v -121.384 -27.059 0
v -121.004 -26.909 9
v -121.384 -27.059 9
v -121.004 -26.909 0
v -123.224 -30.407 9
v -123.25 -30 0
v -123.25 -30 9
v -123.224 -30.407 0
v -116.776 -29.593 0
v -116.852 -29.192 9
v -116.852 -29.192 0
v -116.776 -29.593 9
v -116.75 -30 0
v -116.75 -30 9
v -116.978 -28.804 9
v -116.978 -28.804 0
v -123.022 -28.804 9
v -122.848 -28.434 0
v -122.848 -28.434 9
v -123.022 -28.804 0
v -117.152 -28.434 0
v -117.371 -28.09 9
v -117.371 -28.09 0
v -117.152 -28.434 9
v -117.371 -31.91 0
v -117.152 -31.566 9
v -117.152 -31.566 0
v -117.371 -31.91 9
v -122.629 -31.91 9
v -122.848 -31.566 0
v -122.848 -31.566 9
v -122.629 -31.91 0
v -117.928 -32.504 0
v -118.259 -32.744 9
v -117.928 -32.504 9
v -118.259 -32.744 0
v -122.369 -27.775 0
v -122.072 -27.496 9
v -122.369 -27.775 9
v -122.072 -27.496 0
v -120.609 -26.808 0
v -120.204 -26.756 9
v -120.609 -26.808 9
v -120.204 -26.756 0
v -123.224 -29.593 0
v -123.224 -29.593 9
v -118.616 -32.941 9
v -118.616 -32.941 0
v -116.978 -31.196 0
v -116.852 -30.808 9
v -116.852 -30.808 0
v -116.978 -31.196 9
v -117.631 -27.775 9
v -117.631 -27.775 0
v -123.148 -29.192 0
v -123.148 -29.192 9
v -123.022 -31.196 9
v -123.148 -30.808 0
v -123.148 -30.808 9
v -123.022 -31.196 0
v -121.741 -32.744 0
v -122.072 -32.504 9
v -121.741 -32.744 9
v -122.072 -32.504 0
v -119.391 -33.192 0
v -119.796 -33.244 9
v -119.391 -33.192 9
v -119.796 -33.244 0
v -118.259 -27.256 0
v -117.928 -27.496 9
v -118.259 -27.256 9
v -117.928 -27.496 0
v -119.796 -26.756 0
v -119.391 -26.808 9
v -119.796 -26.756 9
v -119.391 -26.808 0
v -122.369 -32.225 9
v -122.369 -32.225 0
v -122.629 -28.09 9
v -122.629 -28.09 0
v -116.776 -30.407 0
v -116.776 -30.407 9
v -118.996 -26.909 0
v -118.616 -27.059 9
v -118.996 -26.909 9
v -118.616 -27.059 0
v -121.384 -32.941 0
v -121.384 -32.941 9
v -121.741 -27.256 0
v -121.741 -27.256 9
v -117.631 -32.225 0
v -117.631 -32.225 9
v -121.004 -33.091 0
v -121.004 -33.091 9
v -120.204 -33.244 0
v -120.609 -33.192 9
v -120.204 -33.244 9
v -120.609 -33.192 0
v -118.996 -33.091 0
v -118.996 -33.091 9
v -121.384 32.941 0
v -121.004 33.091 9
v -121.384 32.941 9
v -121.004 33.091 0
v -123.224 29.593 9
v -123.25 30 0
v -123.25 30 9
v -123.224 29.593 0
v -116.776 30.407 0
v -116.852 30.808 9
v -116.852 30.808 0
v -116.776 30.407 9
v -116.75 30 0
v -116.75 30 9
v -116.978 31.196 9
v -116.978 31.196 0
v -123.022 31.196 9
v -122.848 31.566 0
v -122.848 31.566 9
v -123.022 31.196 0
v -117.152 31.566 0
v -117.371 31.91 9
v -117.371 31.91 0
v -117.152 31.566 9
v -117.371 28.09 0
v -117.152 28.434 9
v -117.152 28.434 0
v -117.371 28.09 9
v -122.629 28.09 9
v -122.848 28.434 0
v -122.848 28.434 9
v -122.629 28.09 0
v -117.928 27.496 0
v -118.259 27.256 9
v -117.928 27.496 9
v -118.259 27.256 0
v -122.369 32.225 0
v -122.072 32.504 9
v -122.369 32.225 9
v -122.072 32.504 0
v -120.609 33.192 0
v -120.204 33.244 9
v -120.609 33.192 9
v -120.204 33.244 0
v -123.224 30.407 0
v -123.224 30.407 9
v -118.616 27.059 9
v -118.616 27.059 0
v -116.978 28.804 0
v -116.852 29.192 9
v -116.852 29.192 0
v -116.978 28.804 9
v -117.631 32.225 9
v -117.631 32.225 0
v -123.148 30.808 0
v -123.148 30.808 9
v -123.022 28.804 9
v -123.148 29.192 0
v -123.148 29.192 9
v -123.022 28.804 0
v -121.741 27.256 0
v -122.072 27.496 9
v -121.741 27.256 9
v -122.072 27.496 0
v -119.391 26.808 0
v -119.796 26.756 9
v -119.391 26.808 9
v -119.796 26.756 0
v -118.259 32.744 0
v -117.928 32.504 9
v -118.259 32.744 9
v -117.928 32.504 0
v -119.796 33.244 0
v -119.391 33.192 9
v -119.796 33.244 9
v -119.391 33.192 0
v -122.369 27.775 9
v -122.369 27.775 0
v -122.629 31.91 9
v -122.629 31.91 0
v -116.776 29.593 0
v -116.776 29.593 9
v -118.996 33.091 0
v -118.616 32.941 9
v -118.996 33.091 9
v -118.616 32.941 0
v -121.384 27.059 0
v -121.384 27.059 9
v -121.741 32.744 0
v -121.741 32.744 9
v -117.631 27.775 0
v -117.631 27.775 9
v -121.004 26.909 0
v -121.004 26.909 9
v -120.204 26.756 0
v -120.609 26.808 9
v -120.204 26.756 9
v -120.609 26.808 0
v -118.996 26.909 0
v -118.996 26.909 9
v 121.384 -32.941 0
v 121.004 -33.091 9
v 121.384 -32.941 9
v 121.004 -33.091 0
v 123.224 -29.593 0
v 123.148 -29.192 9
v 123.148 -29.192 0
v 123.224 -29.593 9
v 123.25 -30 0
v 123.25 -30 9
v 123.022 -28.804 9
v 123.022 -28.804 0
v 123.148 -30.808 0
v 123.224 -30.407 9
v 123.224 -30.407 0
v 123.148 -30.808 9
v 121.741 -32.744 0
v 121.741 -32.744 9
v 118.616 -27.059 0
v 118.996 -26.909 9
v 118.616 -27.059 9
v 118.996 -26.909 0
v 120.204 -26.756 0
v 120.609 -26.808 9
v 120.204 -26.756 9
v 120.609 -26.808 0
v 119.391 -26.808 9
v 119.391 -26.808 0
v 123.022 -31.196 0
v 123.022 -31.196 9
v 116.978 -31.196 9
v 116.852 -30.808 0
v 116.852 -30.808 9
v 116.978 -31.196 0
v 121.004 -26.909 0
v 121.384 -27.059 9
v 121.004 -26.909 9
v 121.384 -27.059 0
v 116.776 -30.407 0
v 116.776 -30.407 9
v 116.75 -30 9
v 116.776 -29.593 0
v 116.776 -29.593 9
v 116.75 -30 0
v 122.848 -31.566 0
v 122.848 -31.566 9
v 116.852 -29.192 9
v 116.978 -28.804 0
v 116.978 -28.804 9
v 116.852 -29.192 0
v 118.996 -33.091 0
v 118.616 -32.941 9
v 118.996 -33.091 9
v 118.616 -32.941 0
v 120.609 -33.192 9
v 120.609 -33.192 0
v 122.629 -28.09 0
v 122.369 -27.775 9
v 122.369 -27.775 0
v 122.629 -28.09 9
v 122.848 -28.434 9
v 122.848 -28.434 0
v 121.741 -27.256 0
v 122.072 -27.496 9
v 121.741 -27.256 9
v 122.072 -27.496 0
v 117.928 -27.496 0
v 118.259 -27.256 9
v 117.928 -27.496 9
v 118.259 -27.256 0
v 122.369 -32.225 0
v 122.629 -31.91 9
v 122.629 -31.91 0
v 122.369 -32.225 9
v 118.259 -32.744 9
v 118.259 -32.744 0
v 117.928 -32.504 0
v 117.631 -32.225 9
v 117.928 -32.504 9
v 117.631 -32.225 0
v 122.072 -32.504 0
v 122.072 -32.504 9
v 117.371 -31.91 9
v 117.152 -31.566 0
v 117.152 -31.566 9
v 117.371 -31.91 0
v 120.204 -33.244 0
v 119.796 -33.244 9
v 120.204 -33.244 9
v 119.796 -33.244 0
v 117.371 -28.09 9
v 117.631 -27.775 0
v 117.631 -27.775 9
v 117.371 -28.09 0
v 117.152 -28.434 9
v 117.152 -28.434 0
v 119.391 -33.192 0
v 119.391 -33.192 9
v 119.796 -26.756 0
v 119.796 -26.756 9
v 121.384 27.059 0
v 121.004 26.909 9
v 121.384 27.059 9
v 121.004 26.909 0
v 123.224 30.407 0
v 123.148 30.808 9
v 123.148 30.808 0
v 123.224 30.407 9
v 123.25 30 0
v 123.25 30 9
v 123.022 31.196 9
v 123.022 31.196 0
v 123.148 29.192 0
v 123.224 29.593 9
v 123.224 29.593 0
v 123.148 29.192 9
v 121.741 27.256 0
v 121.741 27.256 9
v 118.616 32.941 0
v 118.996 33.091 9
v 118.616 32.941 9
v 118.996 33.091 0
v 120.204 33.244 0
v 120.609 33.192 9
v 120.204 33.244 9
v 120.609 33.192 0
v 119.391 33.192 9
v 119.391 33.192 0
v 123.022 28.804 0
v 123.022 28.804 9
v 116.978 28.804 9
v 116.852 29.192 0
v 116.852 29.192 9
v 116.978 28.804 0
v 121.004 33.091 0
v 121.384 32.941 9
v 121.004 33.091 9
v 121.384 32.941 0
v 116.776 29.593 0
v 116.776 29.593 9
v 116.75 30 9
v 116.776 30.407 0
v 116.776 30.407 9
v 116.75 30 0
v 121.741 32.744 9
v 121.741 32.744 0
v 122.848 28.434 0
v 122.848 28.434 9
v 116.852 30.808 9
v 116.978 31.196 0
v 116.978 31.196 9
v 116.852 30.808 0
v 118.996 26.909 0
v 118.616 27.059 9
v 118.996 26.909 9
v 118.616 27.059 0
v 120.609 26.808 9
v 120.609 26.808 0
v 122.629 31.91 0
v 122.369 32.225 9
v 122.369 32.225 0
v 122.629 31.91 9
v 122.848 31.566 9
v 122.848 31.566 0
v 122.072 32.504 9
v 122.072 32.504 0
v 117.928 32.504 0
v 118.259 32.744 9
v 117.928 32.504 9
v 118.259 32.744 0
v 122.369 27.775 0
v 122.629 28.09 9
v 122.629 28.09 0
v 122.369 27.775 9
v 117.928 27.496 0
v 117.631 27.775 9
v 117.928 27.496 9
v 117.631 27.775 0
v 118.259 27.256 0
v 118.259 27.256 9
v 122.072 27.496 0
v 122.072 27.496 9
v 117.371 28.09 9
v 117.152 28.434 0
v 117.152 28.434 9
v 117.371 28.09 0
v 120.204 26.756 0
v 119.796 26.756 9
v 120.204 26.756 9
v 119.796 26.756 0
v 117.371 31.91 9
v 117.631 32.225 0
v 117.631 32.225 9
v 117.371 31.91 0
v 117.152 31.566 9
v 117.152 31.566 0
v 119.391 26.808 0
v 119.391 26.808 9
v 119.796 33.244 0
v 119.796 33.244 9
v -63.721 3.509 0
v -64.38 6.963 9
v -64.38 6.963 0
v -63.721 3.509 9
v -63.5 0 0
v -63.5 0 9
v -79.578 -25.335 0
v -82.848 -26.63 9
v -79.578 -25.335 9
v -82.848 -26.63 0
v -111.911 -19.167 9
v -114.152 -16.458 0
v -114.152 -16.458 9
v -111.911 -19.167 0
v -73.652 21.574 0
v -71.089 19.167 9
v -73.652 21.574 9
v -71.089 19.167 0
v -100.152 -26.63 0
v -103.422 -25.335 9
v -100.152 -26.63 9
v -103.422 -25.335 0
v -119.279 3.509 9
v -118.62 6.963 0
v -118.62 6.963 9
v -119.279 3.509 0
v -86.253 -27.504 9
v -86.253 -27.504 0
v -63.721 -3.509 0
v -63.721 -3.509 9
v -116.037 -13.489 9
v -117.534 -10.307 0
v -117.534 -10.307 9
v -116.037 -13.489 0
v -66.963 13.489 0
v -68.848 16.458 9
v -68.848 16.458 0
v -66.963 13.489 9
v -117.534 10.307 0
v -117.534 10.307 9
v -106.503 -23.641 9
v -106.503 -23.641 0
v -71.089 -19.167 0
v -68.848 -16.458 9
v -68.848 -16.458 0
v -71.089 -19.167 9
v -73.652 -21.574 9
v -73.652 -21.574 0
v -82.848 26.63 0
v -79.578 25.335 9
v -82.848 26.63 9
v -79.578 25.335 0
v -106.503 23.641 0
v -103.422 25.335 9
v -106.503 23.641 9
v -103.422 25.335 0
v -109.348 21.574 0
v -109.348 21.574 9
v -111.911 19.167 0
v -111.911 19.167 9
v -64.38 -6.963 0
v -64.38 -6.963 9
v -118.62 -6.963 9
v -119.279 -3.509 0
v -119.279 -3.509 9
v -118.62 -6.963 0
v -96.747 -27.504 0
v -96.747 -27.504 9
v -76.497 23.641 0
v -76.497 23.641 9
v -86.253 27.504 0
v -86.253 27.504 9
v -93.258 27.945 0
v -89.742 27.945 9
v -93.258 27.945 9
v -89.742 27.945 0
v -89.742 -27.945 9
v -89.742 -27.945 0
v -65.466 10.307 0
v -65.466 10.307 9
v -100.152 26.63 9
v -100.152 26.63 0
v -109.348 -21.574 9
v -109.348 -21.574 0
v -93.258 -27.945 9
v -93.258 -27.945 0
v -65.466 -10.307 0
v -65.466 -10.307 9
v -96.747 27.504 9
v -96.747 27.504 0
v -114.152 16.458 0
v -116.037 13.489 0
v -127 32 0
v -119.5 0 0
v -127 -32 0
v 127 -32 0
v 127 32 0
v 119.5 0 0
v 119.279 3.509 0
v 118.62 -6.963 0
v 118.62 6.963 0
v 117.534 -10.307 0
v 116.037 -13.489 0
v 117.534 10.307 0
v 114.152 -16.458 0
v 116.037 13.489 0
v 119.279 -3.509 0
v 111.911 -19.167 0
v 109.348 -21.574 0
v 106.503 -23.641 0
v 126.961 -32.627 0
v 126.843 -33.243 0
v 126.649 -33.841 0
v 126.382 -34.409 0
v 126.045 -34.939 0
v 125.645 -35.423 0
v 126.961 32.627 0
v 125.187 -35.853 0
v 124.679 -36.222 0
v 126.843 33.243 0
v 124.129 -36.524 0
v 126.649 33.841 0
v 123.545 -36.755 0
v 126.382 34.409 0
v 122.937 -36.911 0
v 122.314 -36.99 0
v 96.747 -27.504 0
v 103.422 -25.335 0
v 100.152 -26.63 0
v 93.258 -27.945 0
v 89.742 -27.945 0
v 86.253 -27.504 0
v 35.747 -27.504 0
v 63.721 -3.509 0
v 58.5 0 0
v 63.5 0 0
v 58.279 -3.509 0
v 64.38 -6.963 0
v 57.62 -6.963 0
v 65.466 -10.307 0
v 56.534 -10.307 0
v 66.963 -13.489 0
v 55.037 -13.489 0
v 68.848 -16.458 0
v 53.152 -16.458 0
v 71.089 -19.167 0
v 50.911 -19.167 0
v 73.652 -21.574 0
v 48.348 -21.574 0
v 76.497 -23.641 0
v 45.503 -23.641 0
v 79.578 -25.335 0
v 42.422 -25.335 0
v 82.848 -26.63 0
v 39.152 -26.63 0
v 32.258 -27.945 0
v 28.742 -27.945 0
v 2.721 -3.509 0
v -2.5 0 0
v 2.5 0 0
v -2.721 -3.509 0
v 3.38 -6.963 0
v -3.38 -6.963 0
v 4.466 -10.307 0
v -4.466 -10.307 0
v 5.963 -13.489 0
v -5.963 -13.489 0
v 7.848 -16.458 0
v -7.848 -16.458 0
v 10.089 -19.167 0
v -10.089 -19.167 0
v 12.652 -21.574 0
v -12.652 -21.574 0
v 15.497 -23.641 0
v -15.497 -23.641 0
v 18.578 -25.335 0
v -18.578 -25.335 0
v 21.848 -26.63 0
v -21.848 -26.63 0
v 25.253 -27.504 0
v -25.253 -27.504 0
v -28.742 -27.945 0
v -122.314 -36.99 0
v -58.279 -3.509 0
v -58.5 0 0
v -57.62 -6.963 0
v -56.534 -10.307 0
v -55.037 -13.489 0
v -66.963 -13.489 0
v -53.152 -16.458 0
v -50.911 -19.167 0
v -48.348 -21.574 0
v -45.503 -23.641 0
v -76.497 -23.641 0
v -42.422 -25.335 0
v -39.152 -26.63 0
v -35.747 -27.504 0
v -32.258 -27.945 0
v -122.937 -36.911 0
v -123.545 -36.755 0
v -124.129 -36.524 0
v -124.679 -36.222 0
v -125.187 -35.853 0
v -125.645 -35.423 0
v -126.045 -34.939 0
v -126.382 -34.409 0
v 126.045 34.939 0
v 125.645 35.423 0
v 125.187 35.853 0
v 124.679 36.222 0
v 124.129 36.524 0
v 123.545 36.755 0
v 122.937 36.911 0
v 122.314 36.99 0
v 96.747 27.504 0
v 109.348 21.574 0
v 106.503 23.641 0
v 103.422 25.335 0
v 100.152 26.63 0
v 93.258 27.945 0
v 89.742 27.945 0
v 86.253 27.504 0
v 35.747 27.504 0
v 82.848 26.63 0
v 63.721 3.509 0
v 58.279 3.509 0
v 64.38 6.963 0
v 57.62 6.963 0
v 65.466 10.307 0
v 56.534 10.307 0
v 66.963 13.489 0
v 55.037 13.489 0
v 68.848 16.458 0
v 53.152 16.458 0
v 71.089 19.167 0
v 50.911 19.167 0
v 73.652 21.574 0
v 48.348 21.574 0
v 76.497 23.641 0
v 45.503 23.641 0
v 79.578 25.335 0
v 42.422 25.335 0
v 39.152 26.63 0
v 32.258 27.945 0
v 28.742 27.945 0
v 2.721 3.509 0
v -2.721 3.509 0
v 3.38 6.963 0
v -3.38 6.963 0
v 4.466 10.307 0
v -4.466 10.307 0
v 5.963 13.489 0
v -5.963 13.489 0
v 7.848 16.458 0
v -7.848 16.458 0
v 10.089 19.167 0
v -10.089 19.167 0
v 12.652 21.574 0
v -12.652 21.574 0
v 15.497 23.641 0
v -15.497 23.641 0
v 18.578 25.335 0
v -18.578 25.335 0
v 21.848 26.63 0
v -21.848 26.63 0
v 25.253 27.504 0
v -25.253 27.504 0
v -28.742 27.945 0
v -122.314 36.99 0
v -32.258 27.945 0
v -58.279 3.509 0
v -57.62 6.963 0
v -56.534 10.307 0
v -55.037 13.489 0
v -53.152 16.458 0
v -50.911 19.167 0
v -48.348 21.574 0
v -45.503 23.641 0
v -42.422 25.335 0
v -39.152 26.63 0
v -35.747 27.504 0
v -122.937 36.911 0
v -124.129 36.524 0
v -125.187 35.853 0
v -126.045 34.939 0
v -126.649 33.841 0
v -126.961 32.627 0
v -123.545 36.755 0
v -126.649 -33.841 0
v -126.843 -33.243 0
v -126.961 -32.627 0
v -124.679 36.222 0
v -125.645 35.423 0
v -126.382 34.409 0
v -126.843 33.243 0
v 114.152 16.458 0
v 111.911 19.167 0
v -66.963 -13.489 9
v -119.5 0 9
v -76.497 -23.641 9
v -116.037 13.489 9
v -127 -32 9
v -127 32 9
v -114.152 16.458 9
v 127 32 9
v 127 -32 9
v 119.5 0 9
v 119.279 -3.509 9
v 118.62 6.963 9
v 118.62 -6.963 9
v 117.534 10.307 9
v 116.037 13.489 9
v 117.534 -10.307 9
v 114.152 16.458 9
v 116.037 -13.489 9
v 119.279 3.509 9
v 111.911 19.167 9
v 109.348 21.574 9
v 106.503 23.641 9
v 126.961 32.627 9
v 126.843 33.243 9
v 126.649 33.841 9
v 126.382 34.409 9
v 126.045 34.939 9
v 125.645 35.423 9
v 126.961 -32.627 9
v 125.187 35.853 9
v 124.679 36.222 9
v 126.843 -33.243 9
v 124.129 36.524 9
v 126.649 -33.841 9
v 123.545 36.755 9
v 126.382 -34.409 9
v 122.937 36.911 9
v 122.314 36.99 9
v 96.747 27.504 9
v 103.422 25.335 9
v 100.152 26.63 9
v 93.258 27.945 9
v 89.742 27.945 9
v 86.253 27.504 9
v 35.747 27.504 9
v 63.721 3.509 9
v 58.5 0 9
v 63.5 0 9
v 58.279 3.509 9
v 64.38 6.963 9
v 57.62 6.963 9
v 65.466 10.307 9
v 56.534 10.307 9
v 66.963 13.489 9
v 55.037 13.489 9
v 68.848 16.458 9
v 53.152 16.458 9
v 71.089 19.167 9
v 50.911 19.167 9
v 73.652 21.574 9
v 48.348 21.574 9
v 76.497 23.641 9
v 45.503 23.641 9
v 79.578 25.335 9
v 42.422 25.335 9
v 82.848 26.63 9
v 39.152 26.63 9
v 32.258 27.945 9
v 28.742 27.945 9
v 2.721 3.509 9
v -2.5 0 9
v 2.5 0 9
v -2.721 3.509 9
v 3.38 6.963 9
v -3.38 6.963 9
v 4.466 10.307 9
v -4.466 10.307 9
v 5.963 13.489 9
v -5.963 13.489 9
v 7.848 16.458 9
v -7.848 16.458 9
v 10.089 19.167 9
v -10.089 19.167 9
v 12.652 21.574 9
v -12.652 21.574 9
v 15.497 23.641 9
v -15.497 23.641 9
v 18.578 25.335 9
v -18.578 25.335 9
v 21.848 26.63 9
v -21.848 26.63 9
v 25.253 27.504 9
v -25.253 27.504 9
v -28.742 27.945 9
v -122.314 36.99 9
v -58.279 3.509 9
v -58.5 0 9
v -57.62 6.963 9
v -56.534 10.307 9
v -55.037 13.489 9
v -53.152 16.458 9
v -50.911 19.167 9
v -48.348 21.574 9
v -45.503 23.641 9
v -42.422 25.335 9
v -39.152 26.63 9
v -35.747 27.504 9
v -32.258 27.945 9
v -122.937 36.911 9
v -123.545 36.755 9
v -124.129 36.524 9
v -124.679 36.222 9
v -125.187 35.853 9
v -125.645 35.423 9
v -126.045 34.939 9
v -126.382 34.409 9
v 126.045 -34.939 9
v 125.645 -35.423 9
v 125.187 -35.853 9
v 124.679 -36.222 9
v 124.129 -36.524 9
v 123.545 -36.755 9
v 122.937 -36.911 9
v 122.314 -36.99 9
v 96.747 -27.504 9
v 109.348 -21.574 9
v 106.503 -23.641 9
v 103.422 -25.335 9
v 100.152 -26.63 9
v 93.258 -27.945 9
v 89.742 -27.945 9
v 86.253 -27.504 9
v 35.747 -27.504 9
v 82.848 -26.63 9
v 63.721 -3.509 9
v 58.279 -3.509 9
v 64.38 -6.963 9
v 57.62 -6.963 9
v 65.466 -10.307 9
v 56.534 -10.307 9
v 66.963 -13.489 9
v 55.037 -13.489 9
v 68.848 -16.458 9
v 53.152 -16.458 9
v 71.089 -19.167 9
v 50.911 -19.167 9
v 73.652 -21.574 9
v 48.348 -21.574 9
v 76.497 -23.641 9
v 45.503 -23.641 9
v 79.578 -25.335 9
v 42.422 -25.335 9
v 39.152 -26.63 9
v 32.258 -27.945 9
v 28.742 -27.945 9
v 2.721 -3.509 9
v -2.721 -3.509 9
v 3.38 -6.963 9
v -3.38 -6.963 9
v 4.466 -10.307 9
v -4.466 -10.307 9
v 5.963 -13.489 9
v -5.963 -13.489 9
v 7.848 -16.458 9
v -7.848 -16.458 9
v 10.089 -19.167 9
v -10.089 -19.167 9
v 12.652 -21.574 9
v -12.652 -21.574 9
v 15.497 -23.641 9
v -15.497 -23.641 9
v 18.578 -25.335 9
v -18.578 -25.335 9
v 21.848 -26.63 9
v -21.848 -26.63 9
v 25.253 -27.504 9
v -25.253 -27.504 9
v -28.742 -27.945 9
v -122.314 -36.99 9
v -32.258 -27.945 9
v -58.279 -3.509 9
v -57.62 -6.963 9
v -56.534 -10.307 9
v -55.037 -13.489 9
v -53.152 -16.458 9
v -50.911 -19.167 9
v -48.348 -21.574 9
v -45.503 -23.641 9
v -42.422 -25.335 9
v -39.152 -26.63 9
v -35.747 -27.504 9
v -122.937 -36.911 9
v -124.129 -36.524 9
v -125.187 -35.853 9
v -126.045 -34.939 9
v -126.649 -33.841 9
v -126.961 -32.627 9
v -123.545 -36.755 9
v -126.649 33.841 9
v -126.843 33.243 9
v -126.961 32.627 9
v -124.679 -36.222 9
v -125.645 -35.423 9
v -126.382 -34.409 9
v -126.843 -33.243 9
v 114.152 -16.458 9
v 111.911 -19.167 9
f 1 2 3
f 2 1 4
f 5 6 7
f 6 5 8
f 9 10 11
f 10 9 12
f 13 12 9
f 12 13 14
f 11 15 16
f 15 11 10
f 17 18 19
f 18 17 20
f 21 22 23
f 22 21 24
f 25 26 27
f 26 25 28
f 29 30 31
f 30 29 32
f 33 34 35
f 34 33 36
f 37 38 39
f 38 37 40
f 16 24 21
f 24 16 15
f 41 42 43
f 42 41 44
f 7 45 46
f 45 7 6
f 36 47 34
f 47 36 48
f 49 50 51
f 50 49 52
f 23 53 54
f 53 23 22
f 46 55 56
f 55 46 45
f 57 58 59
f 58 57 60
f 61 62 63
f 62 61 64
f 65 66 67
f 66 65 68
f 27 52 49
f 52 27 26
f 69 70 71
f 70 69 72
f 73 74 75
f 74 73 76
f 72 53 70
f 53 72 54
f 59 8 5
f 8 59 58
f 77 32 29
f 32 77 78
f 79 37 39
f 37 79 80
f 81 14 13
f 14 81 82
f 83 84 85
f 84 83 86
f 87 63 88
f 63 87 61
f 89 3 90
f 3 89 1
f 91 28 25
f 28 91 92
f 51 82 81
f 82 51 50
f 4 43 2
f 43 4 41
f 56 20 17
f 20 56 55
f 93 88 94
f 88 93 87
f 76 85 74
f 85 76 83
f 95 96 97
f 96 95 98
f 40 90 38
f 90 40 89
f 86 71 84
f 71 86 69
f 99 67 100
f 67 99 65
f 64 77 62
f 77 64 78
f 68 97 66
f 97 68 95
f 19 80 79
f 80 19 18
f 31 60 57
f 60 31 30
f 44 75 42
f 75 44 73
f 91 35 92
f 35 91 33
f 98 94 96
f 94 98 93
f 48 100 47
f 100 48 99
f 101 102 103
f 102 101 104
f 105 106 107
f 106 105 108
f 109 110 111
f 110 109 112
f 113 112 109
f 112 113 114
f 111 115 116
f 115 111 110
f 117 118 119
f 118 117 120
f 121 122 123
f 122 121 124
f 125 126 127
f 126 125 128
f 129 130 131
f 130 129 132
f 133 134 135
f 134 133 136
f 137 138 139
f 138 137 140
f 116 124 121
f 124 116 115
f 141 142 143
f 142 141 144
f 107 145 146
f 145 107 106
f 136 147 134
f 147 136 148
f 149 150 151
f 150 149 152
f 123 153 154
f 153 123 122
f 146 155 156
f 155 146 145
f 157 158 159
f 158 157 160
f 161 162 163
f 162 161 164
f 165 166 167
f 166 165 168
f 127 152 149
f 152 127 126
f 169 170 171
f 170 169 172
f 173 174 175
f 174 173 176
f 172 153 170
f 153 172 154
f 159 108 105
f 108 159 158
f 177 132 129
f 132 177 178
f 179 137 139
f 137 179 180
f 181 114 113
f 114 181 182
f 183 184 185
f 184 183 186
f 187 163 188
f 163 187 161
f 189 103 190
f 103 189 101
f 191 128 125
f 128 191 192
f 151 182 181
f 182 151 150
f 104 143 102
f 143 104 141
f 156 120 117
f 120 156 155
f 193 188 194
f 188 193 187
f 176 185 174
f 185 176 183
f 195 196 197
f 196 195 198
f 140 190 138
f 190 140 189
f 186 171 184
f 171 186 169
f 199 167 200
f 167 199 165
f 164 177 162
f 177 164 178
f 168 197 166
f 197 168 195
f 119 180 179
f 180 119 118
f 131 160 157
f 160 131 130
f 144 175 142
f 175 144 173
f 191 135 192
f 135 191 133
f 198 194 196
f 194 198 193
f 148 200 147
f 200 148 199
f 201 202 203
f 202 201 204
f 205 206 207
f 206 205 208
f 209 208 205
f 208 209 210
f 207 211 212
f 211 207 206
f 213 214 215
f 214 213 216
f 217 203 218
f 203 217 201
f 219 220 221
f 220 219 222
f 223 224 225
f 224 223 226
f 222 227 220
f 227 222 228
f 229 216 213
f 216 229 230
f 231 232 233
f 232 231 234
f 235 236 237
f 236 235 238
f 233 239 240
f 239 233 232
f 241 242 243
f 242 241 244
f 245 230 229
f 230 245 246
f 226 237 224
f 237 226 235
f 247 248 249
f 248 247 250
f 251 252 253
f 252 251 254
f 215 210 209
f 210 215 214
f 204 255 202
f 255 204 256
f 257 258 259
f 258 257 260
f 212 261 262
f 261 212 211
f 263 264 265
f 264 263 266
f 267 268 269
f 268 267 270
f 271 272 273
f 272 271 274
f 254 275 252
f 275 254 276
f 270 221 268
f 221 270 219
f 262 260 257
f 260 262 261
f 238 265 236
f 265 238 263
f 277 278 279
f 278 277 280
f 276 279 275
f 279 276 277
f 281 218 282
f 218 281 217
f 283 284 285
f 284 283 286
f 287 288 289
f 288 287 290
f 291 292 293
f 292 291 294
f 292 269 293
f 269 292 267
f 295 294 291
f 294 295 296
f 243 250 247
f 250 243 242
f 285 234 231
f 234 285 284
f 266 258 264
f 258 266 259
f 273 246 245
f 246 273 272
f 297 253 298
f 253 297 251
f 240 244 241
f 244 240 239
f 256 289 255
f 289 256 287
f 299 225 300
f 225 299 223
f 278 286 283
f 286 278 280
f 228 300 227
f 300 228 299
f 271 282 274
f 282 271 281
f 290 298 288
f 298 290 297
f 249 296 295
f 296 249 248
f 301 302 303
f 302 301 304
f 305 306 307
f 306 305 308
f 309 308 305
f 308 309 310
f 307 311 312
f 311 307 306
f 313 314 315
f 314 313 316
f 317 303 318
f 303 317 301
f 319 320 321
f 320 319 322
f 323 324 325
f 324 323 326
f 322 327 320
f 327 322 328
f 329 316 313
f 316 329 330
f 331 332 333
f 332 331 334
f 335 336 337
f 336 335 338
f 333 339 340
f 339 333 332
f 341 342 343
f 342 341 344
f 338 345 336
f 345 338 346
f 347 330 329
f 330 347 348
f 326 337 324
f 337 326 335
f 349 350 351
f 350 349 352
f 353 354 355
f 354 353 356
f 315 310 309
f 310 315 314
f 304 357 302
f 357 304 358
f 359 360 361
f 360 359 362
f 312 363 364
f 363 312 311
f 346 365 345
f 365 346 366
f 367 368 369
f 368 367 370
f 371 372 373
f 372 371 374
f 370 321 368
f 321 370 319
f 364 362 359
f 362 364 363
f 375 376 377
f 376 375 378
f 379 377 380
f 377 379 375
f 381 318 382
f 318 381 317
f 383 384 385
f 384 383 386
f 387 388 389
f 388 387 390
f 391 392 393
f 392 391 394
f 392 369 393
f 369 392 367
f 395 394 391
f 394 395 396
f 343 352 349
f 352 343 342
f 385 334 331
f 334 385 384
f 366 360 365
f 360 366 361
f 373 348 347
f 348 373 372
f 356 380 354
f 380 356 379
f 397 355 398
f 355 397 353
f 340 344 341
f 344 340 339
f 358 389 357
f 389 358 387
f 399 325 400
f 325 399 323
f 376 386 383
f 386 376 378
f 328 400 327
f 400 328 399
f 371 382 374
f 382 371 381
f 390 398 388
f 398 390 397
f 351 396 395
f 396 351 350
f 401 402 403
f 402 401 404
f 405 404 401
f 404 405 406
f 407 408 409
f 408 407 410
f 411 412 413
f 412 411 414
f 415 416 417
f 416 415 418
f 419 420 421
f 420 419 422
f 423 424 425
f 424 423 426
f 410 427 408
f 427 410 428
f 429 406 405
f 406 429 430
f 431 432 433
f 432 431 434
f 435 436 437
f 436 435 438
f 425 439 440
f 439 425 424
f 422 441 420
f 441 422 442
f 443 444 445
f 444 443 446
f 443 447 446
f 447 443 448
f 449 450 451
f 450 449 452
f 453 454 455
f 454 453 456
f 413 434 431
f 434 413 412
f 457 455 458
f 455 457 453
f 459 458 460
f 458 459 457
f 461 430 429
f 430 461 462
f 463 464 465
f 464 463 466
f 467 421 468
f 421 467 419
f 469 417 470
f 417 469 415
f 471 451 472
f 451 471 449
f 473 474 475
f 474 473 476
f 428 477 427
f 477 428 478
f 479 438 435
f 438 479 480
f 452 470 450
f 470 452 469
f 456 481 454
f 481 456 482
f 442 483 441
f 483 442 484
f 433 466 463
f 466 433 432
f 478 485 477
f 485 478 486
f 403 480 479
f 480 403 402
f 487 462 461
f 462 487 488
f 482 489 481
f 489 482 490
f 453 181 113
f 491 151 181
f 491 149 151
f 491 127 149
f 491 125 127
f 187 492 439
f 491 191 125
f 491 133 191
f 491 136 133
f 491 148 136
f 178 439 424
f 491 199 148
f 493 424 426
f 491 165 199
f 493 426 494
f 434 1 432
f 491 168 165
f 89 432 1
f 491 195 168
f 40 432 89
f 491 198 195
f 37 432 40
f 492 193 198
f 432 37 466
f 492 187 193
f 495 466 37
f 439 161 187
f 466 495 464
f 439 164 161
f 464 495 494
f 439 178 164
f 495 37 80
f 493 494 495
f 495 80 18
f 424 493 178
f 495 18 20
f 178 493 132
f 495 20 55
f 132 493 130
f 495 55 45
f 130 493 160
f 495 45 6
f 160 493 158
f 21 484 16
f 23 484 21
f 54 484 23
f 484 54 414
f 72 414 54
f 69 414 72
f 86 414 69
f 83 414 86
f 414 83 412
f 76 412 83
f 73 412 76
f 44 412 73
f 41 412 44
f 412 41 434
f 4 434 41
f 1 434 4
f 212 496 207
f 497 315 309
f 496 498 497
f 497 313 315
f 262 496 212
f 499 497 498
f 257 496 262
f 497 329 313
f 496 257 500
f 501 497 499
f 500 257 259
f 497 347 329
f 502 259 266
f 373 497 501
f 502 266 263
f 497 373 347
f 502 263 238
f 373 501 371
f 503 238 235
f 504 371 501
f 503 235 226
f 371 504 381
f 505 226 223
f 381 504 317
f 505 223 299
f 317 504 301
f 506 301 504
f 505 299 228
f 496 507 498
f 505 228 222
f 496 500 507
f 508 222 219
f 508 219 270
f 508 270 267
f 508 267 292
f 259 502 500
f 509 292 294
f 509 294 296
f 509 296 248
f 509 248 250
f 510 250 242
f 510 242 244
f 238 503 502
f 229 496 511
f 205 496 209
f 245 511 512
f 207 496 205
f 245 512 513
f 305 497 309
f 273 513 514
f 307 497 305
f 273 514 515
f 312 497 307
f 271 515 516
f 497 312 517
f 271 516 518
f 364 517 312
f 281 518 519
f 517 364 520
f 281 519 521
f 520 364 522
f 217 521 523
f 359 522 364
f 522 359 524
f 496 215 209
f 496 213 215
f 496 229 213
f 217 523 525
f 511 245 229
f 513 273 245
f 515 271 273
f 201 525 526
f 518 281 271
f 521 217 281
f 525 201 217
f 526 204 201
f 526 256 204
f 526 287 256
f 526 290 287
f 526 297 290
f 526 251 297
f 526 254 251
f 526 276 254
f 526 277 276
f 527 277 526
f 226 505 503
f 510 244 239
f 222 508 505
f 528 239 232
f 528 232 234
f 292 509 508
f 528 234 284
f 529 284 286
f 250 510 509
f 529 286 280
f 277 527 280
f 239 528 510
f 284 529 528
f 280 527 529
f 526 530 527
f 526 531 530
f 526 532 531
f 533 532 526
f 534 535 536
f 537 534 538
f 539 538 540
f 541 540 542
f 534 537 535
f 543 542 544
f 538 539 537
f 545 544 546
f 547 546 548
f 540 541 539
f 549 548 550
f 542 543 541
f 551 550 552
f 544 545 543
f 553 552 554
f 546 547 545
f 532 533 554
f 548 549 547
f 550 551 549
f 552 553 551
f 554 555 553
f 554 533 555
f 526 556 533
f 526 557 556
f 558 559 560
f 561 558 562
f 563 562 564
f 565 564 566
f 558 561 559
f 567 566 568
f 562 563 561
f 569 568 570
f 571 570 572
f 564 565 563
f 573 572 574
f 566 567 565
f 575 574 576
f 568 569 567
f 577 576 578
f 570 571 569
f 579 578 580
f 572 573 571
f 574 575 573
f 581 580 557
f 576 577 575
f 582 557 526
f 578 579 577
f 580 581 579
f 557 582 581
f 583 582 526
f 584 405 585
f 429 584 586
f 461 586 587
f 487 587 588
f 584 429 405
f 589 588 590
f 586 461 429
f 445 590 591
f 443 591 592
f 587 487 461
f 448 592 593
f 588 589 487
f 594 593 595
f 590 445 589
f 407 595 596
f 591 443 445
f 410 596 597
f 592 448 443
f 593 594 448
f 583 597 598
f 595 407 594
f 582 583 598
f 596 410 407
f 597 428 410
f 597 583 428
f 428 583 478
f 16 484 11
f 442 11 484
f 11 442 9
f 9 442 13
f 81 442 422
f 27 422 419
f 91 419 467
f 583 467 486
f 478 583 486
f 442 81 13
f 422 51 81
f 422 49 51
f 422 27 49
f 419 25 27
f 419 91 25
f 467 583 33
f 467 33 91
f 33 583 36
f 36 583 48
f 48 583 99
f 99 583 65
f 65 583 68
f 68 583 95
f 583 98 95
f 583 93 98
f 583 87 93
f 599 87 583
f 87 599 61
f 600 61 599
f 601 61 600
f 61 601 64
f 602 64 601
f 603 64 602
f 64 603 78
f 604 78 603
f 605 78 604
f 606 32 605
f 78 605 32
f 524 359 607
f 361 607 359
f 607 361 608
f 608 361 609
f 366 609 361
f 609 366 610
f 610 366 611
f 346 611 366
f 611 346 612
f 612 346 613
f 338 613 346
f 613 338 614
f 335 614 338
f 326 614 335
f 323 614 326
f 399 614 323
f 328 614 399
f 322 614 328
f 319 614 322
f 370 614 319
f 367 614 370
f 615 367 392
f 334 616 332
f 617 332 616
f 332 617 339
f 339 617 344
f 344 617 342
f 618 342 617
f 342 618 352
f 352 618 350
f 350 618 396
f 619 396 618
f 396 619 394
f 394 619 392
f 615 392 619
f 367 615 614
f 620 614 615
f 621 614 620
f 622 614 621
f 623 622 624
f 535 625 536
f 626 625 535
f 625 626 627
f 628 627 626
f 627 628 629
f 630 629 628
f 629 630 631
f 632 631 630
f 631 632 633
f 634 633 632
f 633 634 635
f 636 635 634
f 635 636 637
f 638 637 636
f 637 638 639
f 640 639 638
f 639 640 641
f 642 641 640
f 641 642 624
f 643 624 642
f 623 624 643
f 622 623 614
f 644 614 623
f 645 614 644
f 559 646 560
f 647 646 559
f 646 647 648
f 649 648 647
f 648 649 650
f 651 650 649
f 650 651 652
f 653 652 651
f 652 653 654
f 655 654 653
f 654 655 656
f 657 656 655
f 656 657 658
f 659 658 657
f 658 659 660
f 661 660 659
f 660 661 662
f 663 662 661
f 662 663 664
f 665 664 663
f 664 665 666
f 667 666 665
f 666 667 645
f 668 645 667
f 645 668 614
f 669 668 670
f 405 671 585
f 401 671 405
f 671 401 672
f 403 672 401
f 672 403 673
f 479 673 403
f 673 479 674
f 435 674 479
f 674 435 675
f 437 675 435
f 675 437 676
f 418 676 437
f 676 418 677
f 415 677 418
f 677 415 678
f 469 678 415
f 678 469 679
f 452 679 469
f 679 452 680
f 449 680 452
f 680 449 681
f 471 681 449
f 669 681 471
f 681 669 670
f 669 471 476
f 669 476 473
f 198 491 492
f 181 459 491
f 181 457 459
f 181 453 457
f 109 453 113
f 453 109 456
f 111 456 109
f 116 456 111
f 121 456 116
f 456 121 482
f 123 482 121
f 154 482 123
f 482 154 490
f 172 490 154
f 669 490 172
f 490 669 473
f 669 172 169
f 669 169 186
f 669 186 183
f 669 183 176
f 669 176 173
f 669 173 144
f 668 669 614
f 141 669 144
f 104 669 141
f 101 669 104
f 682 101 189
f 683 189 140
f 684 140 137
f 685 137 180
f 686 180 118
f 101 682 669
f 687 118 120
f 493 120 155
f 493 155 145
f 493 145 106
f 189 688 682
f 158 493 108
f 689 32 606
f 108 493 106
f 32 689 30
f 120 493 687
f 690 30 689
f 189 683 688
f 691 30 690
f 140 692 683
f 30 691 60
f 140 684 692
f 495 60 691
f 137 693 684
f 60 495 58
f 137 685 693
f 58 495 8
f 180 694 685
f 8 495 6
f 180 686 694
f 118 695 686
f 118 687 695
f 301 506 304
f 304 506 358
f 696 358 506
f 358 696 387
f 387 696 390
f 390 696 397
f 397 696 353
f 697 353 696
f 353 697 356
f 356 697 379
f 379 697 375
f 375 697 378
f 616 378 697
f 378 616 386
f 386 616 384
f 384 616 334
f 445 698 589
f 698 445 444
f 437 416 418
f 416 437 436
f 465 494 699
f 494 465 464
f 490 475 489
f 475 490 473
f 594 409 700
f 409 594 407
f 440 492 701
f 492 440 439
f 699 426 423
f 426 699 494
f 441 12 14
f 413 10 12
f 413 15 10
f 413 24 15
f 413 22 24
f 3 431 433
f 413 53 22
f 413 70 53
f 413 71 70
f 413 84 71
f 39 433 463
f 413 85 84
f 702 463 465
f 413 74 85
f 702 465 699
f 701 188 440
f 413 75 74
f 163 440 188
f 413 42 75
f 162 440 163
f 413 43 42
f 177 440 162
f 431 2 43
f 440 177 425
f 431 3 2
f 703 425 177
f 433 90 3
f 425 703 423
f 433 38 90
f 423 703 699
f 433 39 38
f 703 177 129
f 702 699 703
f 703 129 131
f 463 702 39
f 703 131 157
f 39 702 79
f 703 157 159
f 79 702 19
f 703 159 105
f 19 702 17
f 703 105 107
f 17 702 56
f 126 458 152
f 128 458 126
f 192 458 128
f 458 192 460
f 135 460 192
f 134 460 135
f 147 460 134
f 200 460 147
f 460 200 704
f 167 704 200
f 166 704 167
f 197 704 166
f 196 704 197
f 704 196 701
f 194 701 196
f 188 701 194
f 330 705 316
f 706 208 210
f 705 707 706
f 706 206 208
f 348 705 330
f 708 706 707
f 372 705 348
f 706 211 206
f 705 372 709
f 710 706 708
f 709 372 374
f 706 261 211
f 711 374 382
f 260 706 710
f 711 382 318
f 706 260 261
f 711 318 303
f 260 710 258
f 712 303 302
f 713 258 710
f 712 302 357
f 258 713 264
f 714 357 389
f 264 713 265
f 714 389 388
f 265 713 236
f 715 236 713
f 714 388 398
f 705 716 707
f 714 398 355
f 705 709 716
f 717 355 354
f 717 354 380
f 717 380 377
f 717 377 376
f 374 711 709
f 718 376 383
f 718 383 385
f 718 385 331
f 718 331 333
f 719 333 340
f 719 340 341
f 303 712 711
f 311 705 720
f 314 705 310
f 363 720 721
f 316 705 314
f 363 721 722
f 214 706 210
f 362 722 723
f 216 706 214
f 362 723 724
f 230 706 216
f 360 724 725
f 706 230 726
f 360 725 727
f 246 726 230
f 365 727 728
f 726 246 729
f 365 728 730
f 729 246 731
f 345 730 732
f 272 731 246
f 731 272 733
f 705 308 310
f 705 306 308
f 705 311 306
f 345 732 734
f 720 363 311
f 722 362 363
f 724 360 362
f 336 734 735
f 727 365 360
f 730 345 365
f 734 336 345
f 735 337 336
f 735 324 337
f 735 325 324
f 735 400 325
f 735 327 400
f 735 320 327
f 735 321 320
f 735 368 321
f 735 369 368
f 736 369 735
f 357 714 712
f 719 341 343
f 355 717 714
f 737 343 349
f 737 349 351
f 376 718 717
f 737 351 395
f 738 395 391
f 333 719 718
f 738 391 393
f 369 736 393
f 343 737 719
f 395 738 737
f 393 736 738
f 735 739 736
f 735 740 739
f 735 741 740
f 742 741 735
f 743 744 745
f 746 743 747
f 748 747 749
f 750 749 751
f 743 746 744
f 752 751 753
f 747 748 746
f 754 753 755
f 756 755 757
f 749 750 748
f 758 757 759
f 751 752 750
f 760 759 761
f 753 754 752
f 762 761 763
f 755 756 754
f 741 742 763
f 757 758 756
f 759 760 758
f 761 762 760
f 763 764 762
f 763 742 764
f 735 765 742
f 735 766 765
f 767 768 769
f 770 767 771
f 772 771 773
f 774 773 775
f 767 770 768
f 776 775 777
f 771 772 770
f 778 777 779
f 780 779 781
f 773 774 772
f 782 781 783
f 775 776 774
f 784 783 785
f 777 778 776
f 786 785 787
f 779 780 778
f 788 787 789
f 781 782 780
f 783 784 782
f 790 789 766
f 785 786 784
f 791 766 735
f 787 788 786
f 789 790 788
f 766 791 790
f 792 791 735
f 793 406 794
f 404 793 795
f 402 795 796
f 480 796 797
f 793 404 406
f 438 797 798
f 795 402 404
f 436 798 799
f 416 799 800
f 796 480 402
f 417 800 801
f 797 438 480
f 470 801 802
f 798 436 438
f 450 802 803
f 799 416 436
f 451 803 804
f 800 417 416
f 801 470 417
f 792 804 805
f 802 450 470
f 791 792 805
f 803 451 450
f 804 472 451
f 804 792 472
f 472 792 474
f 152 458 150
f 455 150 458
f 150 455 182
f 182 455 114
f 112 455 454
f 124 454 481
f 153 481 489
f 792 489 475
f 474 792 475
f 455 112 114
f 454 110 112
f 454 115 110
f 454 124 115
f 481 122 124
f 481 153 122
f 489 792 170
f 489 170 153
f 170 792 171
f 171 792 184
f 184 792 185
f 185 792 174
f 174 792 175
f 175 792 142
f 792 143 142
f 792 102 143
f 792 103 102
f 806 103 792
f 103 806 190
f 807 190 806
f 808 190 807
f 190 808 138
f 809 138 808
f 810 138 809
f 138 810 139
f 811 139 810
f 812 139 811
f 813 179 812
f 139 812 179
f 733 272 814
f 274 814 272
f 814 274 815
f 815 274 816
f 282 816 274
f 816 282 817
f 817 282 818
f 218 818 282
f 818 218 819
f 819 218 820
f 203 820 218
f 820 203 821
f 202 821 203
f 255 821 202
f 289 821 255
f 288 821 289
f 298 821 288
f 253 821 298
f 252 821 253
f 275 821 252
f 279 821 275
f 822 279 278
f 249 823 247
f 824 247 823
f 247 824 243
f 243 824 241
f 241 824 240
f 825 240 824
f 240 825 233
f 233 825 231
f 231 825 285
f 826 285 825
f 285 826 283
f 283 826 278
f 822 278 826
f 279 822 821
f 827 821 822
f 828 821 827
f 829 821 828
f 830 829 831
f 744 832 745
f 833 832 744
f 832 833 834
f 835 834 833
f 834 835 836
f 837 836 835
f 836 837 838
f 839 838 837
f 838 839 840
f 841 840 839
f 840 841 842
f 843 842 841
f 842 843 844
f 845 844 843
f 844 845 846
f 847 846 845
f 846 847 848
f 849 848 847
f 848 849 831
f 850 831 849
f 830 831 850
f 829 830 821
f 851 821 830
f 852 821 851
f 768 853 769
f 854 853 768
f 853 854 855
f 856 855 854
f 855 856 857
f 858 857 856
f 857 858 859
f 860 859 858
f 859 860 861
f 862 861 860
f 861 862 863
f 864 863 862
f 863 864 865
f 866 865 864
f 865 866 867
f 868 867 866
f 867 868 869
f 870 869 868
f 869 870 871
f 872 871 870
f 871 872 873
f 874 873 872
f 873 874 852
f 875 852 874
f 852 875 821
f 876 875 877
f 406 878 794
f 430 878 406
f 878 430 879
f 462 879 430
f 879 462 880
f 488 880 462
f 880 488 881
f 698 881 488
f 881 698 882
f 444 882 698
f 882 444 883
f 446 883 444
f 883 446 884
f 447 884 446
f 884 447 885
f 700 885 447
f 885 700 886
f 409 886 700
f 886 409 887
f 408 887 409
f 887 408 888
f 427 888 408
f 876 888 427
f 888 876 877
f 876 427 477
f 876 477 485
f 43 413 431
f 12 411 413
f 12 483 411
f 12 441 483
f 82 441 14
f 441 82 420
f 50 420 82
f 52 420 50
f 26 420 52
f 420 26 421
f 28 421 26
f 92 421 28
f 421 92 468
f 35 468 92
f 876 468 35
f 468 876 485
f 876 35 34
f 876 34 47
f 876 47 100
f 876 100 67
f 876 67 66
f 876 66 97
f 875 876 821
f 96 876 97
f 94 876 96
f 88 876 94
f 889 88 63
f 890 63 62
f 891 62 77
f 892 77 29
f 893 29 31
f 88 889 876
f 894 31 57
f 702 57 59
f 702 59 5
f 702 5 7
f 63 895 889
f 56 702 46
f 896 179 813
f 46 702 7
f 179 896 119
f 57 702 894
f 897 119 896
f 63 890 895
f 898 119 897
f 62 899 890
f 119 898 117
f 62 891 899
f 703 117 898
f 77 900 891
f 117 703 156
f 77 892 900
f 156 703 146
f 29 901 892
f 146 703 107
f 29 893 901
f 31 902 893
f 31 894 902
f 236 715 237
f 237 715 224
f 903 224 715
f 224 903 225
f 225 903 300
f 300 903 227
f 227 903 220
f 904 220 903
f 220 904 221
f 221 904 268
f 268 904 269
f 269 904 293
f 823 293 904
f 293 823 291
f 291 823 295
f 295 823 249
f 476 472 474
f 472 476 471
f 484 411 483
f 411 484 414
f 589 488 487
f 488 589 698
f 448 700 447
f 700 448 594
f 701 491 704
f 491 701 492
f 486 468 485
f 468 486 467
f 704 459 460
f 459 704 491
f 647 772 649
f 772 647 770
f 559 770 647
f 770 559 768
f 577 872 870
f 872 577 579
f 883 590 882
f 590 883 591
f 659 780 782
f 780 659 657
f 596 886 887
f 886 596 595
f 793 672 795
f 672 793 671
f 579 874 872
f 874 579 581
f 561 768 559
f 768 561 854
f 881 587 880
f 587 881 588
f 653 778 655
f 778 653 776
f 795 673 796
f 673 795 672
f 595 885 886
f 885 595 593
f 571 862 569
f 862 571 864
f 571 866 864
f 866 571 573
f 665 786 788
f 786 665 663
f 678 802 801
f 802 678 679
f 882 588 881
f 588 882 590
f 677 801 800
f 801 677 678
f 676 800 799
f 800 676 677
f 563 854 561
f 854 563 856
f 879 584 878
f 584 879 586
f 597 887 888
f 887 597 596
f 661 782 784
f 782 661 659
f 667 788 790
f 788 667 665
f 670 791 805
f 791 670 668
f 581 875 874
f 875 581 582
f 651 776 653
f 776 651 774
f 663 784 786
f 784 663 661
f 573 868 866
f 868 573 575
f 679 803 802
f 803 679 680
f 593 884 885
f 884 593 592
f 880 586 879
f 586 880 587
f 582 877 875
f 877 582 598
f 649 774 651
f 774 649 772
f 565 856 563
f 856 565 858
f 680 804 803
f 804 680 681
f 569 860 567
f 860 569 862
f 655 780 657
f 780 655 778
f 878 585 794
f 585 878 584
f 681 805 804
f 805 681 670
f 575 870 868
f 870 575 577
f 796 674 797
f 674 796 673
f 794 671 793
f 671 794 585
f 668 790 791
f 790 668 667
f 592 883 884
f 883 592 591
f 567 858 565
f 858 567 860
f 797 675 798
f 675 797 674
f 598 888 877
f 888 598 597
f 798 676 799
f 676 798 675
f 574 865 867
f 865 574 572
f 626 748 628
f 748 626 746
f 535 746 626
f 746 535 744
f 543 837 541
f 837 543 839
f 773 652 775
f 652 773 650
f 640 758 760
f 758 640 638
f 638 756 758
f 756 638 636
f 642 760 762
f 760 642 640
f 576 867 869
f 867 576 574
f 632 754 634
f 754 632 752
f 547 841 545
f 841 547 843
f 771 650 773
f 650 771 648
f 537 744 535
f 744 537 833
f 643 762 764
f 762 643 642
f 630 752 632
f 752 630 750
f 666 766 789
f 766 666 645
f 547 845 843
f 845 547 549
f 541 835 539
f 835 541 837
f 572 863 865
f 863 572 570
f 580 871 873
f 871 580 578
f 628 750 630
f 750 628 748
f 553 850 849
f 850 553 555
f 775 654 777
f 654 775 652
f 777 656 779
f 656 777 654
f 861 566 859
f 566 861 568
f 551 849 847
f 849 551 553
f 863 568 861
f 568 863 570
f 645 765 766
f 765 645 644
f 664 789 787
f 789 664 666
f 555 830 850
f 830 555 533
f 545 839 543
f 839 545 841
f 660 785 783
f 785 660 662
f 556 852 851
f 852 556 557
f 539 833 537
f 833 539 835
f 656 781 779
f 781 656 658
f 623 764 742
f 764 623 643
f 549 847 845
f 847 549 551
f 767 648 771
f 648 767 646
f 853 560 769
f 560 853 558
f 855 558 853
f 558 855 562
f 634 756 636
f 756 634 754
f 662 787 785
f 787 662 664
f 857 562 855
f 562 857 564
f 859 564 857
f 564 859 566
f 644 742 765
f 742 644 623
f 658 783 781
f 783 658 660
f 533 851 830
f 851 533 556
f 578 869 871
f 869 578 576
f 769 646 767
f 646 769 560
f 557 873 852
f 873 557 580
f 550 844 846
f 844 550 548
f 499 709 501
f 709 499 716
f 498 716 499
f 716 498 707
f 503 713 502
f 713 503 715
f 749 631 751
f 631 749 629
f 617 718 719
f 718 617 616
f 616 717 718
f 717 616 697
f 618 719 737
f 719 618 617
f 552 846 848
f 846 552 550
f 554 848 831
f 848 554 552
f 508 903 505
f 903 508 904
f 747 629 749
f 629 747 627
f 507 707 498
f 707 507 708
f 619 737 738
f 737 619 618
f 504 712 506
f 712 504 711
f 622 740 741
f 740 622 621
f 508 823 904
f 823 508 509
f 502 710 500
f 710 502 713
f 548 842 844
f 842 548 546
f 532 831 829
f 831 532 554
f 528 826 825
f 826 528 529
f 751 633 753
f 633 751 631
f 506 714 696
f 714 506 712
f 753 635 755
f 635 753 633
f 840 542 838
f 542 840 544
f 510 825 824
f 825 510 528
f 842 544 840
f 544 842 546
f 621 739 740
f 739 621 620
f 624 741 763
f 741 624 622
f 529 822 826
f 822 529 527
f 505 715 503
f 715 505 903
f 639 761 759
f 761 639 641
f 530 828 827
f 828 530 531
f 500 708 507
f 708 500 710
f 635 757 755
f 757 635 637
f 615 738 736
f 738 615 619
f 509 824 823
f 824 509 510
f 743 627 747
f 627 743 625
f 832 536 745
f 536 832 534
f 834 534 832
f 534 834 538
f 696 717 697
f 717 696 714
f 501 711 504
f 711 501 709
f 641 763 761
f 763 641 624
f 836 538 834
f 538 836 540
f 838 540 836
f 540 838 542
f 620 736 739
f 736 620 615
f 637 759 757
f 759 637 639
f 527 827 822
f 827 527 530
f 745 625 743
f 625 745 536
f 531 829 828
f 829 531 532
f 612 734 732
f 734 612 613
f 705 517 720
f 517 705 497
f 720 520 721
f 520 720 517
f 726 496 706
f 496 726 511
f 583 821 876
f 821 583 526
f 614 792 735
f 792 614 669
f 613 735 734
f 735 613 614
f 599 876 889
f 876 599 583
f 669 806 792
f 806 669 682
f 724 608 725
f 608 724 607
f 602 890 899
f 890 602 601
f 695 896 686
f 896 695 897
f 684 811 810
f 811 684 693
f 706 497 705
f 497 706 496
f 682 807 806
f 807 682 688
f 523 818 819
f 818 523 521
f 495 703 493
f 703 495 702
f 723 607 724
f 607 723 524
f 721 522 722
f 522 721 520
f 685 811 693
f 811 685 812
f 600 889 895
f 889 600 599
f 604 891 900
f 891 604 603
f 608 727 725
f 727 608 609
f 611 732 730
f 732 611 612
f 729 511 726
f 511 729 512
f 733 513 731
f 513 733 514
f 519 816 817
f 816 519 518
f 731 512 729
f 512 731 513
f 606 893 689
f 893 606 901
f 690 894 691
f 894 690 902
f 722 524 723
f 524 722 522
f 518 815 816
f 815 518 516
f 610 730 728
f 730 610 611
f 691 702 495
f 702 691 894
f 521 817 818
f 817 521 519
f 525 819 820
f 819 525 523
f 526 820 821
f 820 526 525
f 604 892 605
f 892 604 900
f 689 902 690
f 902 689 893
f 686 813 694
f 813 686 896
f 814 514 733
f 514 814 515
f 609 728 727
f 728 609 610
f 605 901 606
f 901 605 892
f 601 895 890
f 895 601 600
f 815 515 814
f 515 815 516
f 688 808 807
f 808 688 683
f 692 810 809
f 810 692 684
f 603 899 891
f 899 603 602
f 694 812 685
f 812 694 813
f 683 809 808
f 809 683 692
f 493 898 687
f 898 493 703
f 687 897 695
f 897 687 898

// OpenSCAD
$fn = 50;


difference() {
	union() {
		hull() {
			translate(v = [-122.0000000000, 32.0000000000, 0]) {
				cylinder(h = 9, r = 5);
			}
			translate(v = [122.0000000000, 32.0000000000, 0]) {
				cylinder(h = 9, r = 5);
			}
			translate(v = [-122.0000000000, -32.0000000000, 0]) {
				cylinder(h = 9, r = 5);
			}
			translate(v = [122.0000000000, -32.0000000000, 0]) {
				cylinder(h = 9, r = 5);
			}
		}
	}
	union() {
		#translate(v = [-120.0000000000, -30.0000000000, -100.0000000000]) {
			cylinder(h = 200, r = 3.2500000000);
		}
		#translate(v = [-120.0000000000, 30.0000000000, -100.0000000000]) {
			cylinder(h = 200, r = 3.2500000000);
		}
		#translate(v = [120.0000000000, -30.0000000000, -100.0000000000]) {
			cylinder(h = 200, r = 3.2500000000);
		}
		#translate(v = [120.0000000000, 30.0000000000, -100.0000000000]) {
			cylinder(h = 200, r = 3.2500000000);
		}
		#translate(v = [-91.5000000000, 0, 0]) {
			cylinder(h = 9, r = 28.0000000000);
		}
		#translate(v = [-30.5000000000, 0, 0]) {
			cylinder(h = 9, r = 28.0000000000);
		}
		#translate(v = [30.5000000000, 0, 0]) {
			cylinder(h = 9, r = 28.0000000000);
		}
		#translate(v = [91.5000000000, 0, 0]) {
			cylinder(h = 9, r = 28.0000000000);
		}
	}
}
